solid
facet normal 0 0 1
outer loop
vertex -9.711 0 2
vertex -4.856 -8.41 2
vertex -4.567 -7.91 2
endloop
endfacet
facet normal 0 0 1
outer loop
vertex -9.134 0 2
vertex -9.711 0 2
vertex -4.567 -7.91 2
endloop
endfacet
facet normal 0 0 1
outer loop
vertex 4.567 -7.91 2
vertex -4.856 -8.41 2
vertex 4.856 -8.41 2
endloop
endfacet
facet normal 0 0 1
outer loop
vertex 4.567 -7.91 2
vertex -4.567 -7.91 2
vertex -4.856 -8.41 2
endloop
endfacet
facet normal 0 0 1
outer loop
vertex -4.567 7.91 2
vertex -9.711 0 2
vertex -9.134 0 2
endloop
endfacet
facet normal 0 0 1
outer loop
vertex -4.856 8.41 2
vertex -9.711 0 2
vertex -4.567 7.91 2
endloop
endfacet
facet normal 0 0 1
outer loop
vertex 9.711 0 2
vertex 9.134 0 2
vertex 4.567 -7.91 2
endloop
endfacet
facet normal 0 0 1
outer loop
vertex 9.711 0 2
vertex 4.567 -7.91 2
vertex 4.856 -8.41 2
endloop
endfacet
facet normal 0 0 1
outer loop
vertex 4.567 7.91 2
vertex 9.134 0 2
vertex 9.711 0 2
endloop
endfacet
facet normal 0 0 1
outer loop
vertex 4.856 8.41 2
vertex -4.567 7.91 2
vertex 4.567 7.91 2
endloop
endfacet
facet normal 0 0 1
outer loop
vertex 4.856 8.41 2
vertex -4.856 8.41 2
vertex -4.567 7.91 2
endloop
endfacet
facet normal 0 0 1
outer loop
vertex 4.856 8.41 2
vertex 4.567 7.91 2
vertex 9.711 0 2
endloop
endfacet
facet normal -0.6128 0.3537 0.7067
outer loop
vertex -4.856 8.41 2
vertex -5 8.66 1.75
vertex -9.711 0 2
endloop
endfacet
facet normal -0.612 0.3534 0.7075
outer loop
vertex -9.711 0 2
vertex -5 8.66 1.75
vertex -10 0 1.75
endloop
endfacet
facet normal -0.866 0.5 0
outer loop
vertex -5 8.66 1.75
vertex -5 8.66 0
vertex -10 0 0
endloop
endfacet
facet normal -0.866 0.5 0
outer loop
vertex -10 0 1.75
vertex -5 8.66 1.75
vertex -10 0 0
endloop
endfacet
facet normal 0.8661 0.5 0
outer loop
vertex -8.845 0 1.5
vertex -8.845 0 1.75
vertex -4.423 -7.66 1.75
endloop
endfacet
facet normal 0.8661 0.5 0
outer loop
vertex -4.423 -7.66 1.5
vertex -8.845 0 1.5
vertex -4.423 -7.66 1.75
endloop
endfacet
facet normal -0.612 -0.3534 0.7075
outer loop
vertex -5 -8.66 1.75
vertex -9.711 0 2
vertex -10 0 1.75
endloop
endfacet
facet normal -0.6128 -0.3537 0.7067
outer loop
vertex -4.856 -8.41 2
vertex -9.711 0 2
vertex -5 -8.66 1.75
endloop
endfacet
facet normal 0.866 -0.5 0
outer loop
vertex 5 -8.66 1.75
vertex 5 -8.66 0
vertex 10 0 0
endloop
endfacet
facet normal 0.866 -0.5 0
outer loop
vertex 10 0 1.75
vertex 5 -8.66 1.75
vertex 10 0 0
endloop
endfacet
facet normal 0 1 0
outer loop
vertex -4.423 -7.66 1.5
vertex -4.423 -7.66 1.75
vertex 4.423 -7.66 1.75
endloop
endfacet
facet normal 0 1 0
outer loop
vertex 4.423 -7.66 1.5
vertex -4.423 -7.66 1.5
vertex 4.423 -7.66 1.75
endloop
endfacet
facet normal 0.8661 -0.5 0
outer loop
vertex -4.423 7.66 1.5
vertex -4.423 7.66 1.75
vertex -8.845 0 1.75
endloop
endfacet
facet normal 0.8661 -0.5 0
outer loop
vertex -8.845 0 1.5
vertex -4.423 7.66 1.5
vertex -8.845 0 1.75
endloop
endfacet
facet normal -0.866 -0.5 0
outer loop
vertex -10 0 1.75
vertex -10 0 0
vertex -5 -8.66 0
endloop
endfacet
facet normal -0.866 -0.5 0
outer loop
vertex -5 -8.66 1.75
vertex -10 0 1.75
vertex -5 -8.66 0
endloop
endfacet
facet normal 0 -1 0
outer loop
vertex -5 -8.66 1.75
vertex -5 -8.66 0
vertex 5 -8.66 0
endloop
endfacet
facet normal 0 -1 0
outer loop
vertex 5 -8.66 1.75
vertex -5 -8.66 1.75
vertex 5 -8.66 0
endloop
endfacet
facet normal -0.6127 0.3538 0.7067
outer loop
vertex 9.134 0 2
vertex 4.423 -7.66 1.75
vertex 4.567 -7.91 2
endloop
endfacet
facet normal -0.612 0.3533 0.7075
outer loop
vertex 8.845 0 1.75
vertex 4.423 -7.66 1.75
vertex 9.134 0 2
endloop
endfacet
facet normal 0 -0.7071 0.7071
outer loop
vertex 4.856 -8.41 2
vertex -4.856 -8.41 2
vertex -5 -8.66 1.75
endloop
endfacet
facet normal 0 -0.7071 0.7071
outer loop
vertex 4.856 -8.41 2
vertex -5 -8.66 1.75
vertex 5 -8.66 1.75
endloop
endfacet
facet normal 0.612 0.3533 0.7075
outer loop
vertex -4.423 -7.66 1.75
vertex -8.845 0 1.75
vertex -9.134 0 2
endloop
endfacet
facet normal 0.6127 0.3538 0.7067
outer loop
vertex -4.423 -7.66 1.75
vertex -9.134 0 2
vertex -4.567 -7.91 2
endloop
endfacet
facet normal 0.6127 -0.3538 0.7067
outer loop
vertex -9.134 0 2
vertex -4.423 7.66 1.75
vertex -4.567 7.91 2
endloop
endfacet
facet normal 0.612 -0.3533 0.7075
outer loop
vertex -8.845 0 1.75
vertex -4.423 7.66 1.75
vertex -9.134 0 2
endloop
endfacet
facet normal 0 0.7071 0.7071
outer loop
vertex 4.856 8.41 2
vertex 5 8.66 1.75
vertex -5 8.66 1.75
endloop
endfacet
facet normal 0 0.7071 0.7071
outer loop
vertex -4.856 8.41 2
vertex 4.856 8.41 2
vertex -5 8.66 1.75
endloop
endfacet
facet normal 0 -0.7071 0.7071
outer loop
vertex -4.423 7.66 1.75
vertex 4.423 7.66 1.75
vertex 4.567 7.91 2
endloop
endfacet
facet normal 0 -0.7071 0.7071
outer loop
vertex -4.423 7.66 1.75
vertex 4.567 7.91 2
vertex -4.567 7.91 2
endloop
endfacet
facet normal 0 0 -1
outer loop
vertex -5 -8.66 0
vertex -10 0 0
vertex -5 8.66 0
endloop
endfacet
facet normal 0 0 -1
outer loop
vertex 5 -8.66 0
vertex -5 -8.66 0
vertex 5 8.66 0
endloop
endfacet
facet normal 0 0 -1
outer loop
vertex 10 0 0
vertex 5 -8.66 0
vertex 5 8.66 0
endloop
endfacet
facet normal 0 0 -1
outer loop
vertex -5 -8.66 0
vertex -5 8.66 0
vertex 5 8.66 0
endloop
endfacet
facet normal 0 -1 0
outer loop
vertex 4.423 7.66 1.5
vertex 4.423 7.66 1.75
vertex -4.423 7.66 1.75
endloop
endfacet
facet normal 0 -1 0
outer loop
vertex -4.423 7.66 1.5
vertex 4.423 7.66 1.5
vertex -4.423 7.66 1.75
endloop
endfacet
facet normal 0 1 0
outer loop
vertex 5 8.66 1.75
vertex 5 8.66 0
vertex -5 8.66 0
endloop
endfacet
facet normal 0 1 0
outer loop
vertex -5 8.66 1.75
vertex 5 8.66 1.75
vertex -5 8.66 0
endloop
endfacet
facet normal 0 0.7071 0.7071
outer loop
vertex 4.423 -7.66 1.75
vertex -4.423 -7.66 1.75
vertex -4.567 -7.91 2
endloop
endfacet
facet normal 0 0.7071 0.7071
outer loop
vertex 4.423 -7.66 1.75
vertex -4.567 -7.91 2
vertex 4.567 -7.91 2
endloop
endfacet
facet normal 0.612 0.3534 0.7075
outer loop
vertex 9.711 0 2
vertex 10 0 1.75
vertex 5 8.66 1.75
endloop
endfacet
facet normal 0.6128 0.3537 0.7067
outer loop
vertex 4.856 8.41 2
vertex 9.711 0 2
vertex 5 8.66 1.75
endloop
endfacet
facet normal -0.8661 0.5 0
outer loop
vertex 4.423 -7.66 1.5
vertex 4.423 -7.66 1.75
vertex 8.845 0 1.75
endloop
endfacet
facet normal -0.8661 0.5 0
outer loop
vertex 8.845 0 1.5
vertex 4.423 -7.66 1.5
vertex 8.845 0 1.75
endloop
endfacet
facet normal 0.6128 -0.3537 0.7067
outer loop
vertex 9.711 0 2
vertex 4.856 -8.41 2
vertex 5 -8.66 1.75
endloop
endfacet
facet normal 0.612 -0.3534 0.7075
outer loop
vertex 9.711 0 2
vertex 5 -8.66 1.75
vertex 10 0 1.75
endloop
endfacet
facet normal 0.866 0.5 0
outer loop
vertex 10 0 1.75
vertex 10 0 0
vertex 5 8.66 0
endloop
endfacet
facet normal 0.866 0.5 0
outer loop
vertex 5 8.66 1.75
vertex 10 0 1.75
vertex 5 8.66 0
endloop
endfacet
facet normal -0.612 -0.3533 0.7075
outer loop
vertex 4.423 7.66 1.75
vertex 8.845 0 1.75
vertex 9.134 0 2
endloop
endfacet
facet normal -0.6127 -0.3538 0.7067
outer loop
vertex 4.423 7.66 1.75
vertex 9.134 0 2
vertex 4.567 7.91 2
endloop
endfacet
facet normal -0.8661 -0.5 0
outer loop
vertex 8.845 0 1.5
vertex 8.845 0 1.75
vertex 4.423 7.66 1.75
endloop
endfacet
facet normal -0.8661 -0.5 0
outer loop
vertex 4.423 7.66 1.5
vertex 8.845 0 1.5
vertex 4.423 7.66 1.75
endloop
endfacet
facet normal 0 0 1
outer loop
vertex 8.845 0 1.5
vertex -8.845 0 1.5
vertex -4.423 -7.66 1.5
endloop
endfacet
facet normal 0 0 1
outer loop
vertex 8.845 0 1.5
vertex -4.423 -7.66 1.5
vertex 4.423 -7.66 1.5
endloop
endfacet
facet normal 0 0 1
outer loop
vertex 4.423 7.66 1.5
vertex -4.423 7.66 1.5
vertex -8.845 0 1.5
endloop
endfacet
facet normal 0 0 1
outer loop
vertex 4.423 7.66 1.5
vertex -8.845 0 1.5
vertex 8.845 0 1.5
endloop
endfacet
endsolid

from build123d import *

# Parameters (mm, degrees)
PAD_DEPTH    = 2
POCKET_DEPTH = 0.5
CHAMFER_SIZE = 0.25


with BuildPart() as part:
    # Sketch → Pad (new body)
    with BuildSketch(Plane.XY):
        Polygon((-5, -8.660254), (5, -8.660254), (10, 0), (5, 8.660254), (-5, 8.660254), (-10, 0), align=None)
    extrude(amount=PAD_DEPTH)

    # Sketch001 → Pocket (cut)
    with BuildSketch(Plane.XY.offset(2)):
        Polygon((4.42265, -7.660254), (8.845299, 0), (4.42265, 7.660254), (-4.42265, 7.660254), (-8.845299, 0), (-4.42265, -7.660254), align=None)
    extrude(amount=-POCKET_DEPTH, mode=Mode.SUBTRACT)

    # Chamfer
    chamfer_edges = [part.edges().sort_by_distance(p)[0] for p in [
        (0, -8.660254, 2),
        (-7.5, -4.330127, 2),
        (7.5, -4.330127, 2),
        (-7.5, 4.330127, 2),
        (7.5, 4.330127, 2),
        (0, 8.660254, 2),
        (0, -7.660254, 2),
        (-6.633975, -3.830127, 2),
        (-6.633975, 3.830127, 2),
        (0, 7.660254, 2),
        (6.633975, 3.830127, 2),
        (6.633975, -3.830127, 2),
    ]]
    chamfer(chamfer_edges, length=CHAMFER_SIZE)


solid = part.part
